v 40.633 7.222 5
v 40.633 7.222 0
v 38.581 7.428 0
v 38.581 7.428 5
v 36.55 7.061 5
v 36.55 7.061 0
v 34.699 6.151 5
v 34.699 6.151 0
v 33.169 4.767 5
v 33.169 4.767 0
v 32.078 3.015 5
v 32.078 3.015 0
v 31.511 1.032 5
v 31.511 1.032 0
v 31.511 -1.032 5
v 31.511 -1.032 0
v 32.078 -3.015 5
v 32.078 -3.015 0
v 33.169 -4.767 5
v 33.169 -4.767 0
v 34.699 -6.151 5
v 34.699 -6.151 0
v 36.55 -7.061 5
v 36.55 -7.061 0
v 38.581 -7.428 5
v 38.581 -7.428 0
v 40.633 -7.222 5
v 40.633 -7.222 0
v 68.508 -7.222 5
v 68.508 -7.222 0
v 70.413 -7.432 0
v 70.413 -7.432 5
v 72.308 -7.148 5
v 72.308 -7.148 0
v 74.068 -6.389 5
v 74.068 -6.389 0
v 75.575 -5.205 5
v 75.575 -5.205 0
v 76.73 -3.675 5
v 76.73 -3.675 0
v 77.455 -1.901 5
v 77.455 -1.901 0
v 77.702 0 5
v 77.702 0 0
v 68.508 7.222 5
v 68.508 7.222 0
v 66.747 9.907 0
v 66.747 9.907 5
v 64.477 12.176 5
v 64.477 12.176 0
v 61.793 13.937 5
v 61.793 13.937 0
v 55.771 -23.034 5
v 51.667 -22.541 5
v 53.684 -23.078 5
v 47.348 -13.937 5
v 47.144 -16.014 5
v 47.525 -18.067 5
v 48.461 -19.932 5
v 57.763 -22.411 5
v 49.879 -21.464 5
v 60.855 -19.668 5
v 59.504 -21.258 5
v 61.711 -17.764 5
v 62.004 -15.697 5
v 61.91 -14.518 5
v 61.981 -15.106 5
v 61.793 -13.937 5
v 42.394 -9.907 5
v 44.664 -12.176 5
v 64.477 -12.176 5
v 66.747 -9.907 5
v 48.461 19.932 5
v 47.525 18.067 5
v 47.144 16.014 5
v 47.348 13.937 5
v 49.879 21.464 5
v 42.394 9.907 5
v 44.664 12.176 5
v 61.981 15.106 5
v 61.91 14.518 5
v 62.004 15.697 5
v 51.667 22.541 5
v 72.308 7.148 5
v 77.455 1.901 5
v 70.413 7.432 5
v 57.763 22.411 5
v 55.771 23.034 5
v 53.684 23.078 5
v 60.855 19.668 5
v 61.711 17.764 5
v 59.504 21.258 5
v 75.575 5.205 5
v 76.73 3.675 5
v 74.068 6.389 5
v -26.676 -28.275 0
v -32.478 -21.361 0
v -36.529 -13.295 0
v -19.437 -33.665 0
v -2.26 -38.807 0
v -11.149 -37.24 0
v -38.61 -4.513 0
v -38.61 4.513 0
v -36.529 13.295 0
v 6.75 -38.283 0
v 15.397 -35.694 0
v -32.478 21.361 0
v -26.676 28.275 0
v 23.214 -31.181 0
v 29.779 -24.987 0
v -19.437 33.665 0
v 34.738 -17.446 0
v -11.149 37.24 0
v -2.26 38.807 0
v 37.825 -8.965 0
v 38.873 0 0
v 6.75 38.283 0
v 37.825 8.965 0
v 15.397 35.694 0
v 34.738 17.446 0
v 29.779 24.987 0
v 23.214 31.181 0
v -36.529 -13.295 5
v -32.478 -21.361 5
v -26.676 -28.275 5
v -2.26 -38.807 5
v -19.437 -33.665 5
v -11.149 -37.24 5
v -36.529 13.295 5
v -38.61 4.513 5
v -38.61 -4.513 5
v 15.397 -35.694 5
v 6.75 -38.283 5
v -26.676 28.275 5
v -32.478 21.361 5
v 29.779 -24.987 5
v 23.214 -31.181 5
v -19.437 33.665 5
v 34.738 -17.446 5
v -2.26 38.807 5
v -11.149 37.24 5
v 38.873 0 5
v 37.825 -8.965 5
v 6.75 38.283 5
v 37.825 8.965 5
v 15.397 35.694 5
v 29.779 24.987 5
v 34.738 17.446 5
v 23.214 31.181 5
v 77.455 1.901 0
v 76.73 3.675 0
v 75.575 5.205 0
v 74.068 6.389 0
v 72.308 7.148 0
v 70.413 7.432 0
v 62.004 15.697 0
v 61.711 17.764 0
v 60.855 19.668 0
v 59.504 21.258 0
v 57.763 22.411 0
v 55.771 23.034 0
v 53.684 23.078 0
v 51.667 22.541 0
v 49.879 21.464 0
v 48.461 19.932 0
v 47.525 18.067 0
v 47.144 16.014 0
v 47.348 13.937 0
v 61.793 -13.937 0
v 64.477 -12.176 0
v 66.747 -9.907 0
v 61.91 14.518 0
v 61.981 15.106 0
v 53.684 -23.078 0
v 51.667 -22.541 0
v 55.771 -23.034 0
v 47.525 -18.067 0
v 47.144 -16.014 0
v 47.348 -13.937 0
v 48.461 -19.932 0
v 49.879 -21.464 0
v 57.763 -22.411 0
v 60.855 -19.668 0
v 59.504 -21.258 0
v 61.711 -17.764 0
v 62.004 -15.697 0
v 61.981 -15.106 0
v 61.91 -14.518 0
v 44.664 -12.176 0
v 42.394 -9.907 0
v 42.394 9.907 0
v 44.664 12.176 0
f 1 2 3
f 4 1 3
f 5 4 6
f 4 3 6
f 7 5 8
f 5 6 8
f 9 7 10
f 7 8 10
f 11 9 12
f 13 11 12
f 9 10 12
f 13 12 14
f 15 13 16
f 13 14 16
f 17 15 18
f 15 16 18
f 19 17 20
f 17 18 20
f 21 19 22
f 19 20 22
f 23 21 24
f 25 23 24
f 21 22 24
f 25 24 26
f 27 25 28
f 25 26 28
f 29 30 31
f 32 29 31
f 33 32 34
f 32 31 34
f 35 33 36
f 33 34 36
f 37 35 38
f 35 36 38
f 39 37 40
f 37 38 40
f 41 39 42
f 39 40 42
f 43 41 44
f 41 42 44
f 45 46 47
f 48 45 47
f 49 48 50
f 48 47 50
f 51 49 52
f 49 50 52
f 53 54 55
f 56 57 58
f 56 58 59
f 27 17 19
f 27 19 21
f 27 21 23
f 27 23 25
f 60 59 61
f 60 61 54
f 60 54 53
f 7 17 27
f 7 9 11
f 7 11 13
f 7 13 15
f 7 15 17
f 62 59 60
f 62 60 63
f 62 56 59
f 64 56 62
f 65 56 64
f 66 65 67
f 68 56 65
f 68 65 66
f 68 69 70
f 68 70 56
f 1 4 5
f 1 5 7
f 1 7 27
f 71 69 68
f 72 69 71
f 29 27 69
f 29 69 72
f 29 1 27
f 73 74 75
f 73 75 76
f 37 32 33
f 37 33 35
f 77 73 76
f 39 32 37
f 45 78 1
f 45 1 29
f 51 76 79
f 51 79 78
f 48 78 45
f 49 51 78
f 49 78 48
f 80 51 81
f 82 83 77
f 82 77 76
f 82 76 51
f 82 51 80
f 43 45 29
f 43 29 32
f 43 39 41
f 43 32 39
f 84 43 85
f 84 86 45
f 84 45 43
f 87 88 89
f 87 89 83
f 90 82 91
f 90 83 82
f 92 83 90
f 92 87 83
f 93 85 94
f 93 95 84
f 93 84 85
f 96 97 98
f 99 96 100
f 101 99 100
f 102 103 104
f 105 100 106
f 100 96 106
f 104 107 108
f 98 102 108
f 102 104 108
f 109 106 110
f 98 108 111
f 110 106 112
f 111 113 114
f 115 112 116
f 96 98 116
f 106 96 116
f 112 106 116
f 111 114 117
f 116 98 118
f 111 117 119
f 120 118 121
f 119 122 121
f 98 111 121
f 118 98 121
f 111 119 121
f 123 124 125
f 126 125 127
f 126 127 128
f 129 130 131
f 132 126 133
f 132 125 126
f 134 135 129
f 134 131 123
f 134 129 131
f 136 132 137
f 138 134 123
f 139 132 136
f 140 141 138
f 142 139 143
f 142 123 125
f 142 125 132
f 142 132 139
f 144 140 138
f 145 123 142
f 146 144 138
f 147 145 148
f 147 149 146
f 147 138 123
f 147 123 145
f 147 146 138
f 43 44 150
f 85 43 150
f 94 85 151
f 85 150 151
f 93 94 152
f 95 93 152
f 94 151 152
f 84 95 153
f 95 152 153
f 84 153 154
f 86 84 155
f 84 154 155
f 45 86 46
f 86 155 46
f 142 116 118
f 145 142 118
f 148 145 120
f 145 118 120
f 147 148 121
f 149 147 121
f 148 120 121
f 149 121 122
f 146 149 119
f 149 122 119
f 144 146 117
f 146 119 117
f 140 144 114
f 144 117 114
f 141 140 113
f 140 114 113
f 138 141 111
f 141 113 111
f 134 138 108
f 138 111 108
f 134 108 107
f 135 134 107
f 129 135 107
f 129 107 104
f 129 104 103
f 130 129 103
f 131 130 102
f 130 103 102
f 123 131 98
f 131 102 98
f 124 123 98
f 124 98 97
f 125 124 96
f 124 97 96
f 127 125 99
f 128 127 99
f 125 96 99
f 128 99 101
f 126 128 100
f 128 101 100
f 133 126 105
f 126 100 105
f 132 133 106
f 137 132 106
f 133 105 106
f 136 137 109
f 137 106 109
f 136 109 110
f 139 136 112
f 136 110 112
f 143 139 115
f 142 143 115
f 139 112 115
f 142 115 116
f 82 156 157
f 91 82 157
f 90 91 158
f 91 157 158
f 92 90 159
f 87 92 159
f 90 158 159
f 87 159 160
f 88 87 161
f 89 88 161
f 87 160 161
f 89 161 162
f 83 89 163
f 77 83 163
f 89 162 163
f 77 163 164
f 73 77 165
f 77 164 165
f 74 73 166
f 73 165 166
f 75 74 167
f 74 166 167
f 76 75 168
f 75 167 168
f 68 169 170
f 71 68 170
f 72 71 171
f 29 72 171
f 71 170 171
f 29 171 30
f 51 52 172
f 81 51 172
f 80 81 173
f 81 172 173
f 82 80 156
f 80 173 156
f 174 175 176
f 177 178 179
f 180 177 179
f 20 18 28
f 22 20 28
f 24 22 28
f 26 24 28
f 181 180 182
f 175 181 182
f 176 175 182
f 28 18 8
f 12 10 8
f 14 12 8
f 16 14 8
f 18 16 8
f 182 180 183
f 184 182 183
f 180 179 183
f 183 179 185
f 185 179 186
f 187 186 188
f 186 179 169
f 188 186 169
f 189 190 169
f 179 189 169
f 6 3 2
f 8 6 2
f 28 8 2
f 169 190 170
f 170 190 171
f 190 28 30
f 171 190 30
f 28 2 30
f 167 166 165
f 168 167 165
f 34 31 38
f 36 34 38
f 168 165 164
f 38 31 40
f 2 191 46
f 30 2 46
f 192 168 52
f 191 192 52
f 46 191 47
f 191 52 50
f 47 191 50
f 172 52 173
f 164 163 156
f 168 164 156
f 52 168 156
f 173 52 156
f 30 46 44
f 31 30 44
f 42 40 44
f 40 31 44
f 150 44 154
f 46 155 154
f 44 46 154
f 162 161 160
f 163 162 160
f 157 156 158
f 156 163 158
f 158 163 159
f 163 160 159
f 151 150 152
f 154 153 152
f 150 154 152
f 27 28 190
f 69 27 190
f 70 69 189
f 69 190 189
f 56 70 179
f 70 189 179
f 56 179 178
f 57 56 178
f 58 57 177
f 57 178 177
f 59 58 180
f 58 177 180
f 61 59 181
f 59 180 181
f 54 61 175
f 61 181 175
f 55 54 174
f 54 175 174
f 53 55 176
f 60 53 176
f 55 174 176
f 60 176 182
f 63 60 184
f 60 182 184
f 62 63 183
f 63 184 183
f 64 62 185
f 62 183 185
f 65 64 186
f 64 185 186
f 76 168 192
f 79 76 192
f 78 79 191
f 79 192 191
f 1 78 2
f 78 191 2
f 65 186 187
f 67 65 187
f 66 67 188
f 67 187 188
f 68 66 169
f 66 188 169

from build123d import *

# Parameters (mm, degrees)
F0_R     = 38.8732643142
F2_DEPTH = 5
F3_DEPTH = 5


with BuildPart() as f2:
    # F0 (on Top) → F2 (new body)
    with BuildSketch(Plane.XY):
        Circle(F0_R)
    extrude(amount=F2_DEPTH)


with BuildPart() as f3:
    # F1 (on Top) → F3 (new body)
    with BuildSketch(Plane.XY):
        with BuildLine():
            ThreePointArc((47.3482671345, 13.937176675), (54.5706376433, 15.6973733292), (61.7930081521, 13.937176675))
            ThreePointArc((61.7930081521, 13.937176675), (61.9513681347, 14.8109504944), (62.0044070793, 15.6973733292))
            ThreePointArc((62.0044070793, 15.6973733292), (53.6842148086, 23.0781038205), (47.3482671345, 13.937176675))
        make_face()
        with BuildLine():
            ThreePointArc((40.6334609684, -7.2223705088), (38.8732643142, 0), (40.6334609684, 7.2223705088))
            ThreePointArc((40.6334609684, 7.2223705088), (31.4394948781, 0), (40.6334609684, -7.2223705088))
        make_face()
        with BuildLine():
            ThreePointArc((46.3070337502, 0), (44.7190244921, 4.5921689831), (40.6334609684, 7.2223705088))
            ThreePointArc((40.6334609684, 7.2223705088), (38.8732643142, 0), (40.6334609684, -7.2223705088))
            ThreePointArc((40.6334609684, -7.2223705088), (44.7190244921, -4.5921689831), (46.3070337502, 0))
        make_face()
        with BuildLine():
            ThreePointArc((47.3482671345, 13.937176675), (54.5706376433, 8.2636038932), (61.7930081521, 13.937176675))
            ThreePointArc((61.7930081521, 13.937176675), (54.5706376433, 15.6973733292), (47.3482671345, 13.937176675))
        make_face()
        with BuildLine():
            ThreePointArc((68.5078143183, -7.2223705088), (69.8216145769, -3.716884718), (70.2680109725, 0))
            ThreePointArc((70.2680109725, 0), (69.8216145769, 3.716884718), (68.5078143183, 7.2223705088))
            ThreePointArc((68.5078143183, 7.2223705088), (62.8342415365, 0), (68.5078143183, -7.2223705088))
        make_face()
        with BuildLine():
            ThreePointArc((68.5078143183, 7.2223705088), (69.8216145769, 3.716884718), (70.2680109725, 0))
            ThreePointArc((70.2680109725, 0), (69.8216145769, -3.716884718), (68.5078143183, -7.2223705088))
            ThreePointArc((68.5078143183, -7.2223705088), (74.8601799556, -5.845760178), (77.7017804085, 0))
            ThreePointArc((77.7017804085, 0), (74.8601799556, 5.845760178), (68.5078143183, 7.2223705088))
        make_face()
        with BuildLine():
            ThreePointArc((62.0044070793, -15.6973733292), (61.9513681347, -14.8109504944), (61.7930081521, -13.937176675))
            ThreePointArc((61.7930081521, -13.937176675), (54.5706376433, -15.6973733292), (47.3482671345, -13.937176675))
            ThreePointArc((47.3482671345, -13.937176675), (53.6842148086, -23.0781038205), (62.0044070793, -15.6973733292))
        make_face()
        with BuildLine():
            ThreePointArc((47.3482671345, -13.937176675), (54.5706376433, -15.6973733292), (61.7930081521, -13.937176675))
            ThreePointArc((61.7930081521, -13.937176675), (54.5706376433, -8.2636038932), (47.3482671345, -13.937176675))
        make_face()
        with BuildLine():
            ThreePointArc((68.5078143183, -7.2223705088), (62.8342415365, 0), (68.5078143183, 7.2223705088))
            ThreePointArc((68.5078143183, 7.2223705088), (65.6703567712, 11.0997191279), (61.7930081521, 13.937176675))
            ThreePointArc((61.7930081521, 13.937176675), (54.5706376433, 8.2636038932), (47.3482671345, 13.937176675))
            ThreePointArc((47.3482671345, 13.937176675), (43.4709185155, 11.0997191279), (40.6334609684, 7.2223705088))
            ThreePointArc((40.6334609684, 7.2223705088), (44.7190244921, 4.5921689831), (46.3070337502, 0))
            ThreePointArc((46.3070337502, 0), (44.7190244921, -4.5921689831), (40.6334609684, -7.2223705088))
            ThreePointArc((40.6334609684, -7.2223705088), (43.4709185155, -11.0997191279), (47.3482671345, -13.937176675))
            ThreePointArc((47.3482671345, -13.937176675), (54.5706376433, -8.2636038932), (61.7930081521, -13.937176675))
            ThreePointArc((61.7930081521, -13.937176675), (65.6703567712, -11.0997191279), (68.5078143183, -7.2223705088))
        make_face()
    extrude(amount=F3_DEPTH)


solid = Compound([f2.part, f3.part])
